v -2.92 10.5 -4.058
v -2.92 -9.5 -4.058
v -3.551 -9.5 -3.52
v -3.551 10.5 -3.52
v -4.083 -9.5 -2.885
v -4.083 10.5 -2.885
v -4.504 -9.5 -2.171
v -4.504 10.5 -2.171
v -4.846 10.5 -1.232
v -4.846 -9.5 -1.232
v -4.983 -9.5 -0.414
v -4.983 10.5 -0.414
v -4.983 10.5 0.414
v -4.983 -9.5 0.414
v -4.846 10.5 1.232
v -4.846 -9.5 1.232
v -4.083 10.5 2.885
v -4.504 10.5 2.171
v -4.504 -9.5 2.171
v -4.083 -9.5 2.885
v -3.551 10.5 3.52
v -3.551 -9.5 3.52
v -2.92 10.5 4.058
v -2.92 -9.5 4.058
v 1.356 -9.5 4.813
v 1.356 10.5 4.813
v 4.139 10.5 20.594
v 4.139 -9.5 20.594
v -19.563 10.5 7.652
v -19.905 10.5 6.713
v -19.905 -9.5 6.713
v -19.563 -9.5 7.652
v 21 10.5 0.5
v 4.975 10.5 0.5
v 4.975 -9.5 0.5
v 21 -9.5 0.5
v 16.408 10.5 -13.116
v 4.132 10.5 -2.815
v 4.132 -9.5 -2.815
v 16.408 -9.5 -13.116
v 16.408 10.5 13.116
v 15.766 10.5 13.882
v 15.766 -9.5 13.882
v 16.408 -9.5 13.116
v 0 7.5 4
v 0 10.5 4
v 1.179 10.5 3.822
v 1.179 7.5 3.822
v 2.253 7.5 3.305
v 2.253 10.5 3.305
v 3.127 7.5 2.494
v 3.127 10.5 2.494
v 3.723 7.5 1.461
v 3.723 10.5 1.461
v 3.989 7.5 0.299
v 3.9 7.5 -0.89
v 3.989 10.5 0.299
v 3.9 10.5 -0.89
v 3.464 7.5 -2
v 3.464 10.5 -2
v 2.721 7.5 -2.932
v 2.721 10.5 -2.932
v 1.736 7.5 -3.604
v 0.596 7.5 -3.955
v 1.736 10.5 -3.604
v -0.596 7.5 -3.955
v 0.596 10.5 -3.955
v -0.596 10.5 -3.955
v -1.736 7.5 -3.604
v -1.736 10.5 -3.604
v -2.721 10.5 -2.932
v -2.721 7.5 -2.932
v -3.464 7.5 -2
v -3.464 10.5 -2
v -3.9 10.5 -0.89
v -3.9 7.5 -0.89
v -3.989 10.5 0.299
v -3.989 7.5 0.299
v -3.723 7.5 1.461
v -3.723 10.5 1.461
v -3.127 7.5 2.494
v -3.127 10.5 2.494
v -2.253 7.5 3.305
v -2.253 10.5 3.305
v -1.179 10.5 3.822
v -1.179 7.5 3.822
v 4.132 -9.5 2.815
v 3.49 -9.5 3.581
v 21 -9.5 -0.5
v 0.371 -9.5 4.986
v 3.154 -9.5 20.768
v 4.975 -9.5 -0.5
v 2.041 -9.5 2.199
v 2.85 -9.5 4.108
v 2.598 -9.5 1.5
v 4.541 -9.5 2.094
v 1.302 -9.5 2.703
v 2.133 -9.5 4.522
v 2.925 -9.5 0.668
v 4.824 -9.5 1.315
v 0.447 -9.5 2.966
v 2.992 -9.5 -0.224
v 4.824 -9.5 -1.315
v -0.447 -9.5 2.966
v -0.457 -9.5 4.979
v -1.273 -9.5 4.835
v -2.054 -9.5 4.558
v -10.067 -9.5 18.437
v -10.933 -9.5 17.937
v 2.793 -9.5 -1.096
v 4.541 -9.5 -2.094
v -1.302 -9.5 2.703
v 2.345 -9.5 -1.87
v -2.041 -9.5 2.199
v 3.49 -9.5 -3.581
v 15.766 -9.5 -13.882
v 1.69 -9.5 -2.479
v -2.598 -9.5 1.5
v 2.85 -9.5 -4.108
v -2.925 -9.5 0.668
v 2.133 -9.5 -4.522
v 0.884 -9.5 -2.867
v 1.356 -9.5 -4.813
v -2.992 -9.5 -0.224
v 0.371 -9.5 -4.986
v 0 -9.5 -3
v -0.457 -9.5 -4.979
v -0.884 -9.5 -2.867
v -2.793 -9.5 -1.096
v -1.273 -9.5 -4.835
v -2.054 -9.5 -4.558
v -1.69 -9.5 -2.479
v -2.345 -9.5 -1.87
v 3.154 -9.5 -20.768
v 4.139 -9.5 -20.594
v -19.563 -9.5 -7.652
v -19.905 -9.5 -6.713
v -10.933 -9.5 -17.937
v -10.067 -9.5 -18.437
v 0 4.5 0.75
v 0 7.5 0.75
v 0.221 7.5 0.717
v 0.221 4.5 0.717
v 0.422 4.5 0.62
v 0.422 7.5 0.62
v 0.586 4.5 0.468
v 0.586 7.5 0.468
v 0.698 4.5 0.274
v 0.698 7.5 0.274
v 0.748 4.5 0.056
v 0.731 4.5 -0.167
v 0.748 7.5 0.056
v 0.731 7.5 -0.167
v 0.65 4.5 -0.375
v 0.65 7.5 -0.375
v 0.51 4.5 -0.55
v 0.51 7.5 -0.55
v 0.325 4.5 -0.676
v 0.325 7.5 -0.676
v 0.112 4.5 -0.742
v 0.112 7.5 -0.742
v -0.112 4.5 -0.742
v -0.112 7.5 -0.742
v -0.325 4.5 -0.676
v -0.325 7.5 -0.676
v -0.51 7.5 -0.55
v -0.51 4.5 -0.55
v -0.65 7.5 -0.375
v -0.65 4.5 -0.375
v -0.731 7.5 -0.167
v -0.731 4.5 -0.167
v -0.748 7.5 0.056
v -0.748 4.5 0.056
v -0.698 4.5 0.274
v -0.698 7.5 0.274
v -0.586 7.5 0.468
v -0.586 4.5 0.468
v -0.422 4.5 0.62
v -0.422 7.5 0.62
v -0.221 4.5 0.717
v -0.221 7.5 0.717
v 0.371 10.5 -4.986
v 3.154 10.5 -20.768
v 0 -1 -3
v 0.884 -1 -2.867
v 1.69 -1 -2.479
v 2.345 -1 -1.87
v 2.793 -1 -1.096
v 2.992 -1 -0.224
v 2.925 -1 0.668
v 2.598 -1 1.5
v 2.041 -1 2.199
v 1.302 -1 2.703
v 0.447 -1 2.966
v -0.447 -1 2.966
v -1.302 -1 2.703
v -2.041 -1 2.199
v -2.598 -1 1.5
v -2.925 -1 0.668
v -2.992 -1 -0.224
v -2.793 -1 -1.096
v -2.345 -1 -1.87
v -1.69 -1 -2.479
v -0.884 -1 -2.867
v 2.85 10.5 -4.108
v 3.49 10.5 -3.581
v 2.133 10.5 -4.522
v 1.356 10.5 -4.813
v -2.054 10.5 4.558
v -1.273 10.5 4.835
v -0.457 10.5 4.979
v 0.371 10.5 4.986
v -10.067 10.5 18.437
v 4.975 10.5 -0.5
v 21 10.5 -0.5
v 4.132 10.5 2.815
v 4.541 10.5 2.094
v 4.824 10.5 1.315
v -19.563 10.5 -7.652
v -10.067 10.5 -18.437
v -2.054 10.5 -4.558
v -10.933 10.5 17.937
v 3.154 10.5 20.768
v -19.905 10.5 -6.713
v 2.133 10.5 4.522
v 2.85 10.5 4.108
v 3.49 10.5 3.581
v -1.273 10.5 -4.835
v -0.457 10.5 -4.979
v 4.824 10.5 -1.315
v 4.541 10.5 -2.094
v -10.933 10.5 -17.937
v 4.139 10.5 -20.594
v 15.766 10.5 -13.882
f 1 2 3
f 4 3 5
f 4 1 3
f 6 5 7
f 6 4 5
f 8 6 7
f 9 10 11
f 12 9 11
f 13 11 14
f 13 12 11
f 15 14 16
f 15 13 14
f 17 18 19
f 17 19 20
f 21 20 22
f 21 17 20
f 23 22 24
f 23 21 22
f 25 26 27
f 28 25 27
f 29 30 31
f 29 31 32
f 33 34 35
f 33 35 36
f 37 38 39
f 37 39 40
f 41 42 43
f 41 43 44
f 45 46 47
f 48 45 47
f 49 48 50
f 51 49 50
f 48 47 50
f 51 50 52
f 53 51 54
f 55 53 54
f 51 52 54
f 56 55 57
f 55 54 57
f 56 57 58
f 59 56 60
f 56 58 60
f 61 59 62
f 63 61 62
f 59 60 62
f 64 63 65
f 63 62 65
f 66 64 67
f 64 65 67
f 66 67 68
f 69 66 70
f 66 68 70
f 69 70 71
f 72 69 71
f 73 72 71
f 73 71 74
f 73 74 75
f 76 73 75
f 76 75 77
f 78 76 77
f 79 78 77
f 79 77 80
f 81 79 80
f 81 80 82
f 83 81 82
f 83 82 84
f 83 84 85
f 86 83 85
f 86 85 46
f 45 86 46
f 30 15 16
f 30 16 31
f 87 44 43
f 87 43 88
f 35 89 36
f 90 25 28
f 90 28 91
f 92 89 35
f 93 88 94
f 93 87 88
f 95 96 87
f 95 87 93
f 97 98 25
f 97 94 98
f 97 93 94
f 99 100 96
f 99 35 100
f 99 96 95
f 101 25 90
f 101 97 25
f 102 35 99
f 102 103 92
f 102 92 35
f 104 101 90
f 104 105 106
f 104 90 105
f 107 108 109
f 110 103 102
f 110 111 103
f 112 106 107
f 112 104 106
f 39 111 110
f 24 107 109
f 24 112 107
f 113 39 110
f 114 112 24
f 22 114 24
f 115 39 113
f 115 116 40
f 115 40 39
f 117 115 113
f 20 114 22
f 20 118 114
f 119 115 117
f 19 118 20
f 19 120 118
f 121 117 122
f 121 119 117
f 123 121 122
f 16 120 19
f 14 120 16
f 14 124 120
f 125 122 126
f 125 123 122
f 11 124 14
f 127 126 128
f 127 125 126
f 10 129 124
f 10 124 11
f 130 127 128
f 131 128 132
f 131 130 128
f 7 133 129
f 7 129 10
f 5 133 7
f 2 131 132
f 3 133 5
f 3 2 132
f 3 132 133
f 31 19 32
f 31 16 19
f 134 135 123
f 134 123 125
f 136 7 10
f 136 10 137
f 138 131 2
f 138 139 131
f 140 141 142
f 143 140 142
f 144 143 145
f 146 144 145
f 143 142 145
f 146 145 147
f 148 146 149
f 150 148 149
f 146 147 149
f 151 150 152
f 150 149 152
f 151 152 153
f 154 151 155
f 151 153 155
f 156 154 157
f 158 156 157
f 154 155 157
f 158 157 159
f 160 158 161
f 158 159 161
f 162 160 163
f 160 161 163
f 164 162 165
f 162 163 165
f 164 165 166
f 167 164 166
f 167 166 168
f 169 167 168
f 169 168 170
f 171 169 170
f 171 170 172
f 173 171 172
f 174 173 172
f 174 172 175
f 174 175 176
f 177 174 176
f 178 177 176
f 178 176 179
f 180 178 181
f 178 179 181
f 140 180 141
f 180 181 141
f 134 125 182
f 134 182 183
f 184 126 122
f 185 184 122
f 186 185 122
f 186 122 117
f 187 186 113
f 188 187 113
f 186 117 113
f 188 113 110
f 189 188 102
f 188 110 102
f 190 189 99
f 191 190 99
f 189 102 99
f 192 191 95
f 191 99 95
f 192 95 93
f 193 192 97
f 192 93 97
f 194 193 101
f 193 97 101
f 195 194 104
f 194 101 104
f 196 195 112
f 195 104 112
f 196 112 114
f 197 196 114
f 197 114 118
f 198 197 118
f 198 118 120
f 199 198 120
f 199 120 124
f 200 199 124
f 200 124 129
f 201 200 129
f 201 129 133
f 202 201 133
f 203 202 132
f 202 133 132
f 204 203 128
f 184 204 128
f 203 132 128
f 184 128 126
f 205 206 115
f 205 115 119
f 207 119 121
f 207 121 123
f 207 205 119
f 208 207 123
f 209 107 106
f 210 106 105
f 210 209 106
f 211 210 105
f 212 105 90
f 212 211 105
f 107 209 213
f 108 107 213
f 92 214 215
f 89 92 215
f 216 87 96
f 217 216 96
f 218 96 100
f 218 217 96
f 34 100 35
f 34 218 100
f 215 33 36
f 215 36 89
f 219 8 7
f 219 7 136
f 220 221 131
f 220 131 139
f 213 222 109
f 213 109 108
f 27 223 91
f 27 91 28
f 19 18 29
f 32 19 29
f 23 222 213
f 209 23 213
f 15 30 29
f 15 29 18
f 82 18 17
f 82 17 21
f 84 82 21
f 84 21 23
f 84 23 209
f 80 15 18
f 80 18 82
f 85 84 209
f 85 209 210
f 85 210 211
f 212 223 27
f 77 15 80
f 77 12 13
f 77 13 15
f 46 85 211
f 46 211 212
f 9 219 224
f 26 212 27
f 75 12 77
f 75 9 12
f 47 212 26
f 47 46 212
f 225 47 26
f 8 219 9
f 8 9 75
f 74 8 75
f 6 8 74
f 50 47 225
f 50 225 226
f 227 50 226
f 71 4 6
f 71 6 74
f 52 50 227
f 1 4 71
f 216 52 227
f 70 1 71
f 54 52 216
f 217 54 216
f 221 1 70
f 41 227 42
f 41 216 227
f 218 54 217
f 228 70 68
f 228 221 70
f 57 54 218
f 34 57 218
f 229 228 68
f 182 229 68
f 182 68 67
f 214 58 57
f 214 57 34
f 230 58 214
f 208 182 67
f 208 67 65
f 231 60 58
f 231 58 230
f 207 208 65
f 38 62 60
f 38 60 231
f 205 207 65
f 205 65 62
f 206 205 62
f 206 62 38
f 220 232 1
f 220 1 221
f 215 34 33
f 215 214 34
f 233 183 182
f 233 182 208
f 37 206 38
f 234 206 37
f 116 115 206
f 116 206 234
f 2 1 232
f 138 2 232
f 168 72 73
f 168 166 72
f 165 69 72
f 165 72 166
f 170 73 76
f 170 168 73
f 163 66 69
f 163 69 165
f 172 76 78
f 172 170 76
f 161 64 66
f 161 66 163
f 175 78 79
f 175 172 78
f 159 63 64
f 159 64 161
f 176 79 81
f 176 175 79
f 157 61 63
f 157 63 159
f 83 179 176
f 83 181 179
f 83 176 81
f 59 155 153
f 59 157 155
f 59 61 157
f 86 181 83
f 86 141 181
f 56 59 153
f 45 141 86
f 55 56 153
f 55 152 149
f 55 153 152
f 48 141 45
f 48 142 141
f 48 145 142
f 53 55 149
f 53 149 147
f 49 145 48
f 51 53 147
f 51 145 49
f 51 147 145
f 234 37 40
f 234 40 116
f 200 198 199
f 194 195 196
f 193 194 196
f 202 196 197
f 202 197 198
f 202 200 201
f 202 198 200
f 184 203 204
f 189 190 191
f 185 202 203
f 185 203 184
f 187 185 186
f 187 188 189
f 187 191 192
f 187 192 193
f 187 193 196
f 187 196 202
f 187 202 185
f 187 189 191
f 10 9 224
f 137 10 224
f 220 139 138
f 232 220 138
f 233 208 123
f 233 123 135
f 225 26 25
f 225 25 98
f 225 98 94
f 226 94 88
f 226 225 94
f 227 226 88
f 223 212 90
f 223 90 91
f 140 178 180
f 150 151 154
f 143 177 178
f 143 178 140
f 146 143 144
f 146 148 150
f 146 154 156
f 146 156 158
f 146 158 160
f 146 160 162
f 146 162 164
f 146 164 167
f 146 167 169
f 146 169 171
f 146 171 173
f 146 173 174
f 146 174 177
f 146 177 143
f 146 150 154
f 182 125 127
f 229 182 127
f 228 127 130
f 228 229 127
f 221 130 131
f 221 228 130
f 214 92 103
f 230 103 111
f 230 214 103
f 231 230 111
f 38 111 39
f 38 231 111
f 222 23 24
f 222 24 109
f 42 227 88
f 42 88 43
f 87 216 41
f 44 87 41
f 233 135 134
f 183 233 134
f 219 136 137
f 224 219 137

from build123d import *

# Parameters (mm, degrees)
SKETCH1_R           = 5
SKETCH1_R_2         = 3
BOSS_EXTRUDE2_DEPTH = 17.5
SKETCH4_W           = 18
SKETCH4_H           = 1
EXTRUDE_THIN1_DEPTH = 35
CIRPATTERN1_COUNT   = 9
SKETCH5_R           = 3
BOSS_EXTRUDE3_DEPTH = 15
SKETCH6_R           = 3.5
SKETCH6_R_2         = 1.5
CUT_EXTRUDE1_DEPTH  = 6
SKETCH15_R          = 1.5
CUT_EXTRUDE2_DEPTH  = 2
SKETCH17_R          = 2.5
BOSS_EXTRUDE4_DEPTH = 3
SKETCH18_R          = 2
CUT_EXTRUDE3_DEPTH  = 2
SKETCH19_R          = 4
CUT_EXTRUDE4_DEPTH  = 20
SKETCH20_W          = 45.677284088
SKETCH20_H          = 45.724664858
CUT_EXTRUDE5_DEPTH  = 8
SKETCH21_R          = 3
BOSS_EXTRUDE5_DEPTH = 1
SKETCH24_R          = 9.912143672
BOSS_EXTRUDE6_DEPTH = 0.5
SKETCH25_R          = 3.2
CUT_EXTRUDE6_DEPTH  = 2.1
SKETCH26_R          = 3.2
BOSS_EXTRUDE7_DEPTH = 0.25
CUT_EXTRUDE8_START  = -7.5
CUT_EXTRUDE8_DEPTH  = 7.5
SKETCH28_R          = 0.5
CUT_EXTRUDE9_DEPTH  = 1.5
CUT_EXTRUDE10_DEPTH = 7
BOSS_EXTRUDE8_START = 10
SKETCH30_R          = 4
BOSS_EXTRUDE8_DEPTH = 10
SKETCH33_R          = 18.064901356
CUT_EXTRUDE13_DEPTH = 20
SKETCH34_R          = 3
CUT_EXTRUDE14_DEPTH = 8.5
SKETCH35_R          = 0.75
CUT_EXTRUDE16_DEPTH = 3


with BuildPart() as part:
    # Sketch1 → Boss-Extrude2 (new, symmetric)
    with BuildSketch(Plane(origin=(0, 0, 0), x_dir=(1, 0, 0), z_dir=(0, 1, 0))):
        with Locations(Location((0, 0, 0), (0, 0, 270))):
            Circle(SKETCH1_R)
        with Locations(Location((0, 0, 0), (0, 0, 270))):
            Circle(SKETCH1_R_2, mode=Mode.SUBTRACT)
    extrude(amount=BOSS_EXTRUDE2_DEPTH, both=True)

    # Sketch4 → Extrude-Thin1 (add)
    with BuildSketch(Plane(origin=(0, 17.5, 0), x_dir=(1, 0, 0), z_dir=(0, 1, 0))):
        with Locations((12, 0)):
            Rectangle(SKETCH4_W, SKETCH4_H)
    extrude_thin1 = extrude(amount=-EXTRUDE_THIN1_DEPTH)

    # CirPattern1: Extrude-Thin1 ×9 about axis
    cirpattern1_axis = Axis((0, 0, 0), (0, 1, 0))
    for i in range(1, CIRPATTERN1_COUNT):
        add(extrude_thin1.rotate(cirpattern1_axis, i * 360 / CIRPATTERN1_COUNT))

    # Sketch5 → Boss-Extrude3 (add)
    with BuildSketch(Plane(origin=(0, -17.5, 0), x_dir=(-1, 0, 0), z_dir=(0, -1, 0))):
        with Locations(Location((0, 0, 0), (0, 0, 90))):
            Circle(SKETCH5_R)
    extrude(amount=-BOSS_EXTRUDE3_DEPTH)

    # Sketch6 → Cut-Extrude1 (cut)
    with BuildSketch(Plane(origin=(0, -17.5, 0), x_dir=(-1, 0, 0), z_dir=(0, -1, 0))):
        with Locations(Location((0, 0, 0), (0, 0, 90))):
            Circle(SKETCH6_R)
        with Locations(Location((0, 0, 0), (0, 0, 90))):
            Circle(SKETCH6_R_2, mode=Mode.SUBTRACT)
    extrude(amount=-CUT_EXTRUDE1_DEPTH, mode=Mode.SUBTRACT)

    # Sketch15 → Cut-Extrude2 (cut)
    with BuildSketch(Plane.XZ.offset(17.5)):
        with Locations(Location((0, 0, 0), (0, 0, 270))):
            Circle(SKETCH15_R)
    extrude(amount=-CUT_EXTRUDE2_DEPTH, mode=Mode.SUBTRACT)

    # Sketch17 → Boss-Extrude4 (add)
    with BuildSketch(Plane.XZ.offset(17.5)):
        with Locations((18.5, 0)):
            Circle(SKETCH17_R)
    extrude(amount=-BOSS_EXTRUDE4_DEPTH)

    # Sketch18 → Cut-Extrude3 (cut)
    with BuildSketch(Plane.XZ.offset(17.5)):
        with Locations(Location((18.5, 0, 0), (0, 0, 270))):
            Circle(SKETCH18_R)
    extrude(amount=-CUT_EXTRUDE3_DEPTH, mode=Mode.SUBTRACT)

    # Sketch19 → Cut-Extrude4 (cut)
    with BuildSketch(Plane(origin=(0, 17.5, 0), x_dir=(1, 0, 0), z_dir=(0, 1, 0))):
        with Locations(Location((0, 0, 0), (0, 0, 270))):
            Circle(SKETCH19_R)
    extrude(amount=-CUT_EXTRUDE4_DEPTH, mode=Mode.SUBTRACT)

    # Sketch20 → Cut-Extrude5 (cut)
    with BuildSketch(Plane(origin=(0, -17.5, 0), x_dir=(-1, 0, 0), z_dir=(0, -1, 0))):
        Rectangle(SKETCH20_W, SKETCH20_H)
    extrude(amount=-CUT_EXTRUDE5_DEPTH, mode=Mode.SUBTRACT)

    # Sketch21 → Boss-Extrude5 (add)
    with BuildSketch(Plane.XZ.offset(9.5)):
        with Locations(Location((0, 0, 0), (0, 0, 90))):
            Circle(SKETCH21_R)
    extrude(amount=BOSS_EXTRUDE5_DEPTH)

    # Sketch23 → Revolve1 (revolve)
    with BuildSketch(Plane(origin=(0, 0, 0), x_dir=(0, 0, -1), z_dir=(1, 0, 0))):
        with BuildLine():
            Line((-3, -10.5), (-2, -10.5))
            Line((-2, -10.5), (0, -10.5))
            Line((0, -10.5), (0, -17.5))
            Line((0, -17.5), (-8.912143672, -17.5))
            Line((-8.912143672, -17.5), (-9.912143672, -17.5))
            ThreePointArc((-9.912143672, -17.5), (-7.260403323, -13.2057636), (-3, -10.5))
        make_face()
    revolve(axis=Axis((0, -11.130650603, 0), (0, -1, 0)))

    # Sketch24 → Boss-Extrude6 (add)
    with BuildSketch(Plane.XZ.offset(17.5)):
        with Locations(Location((0, 0, 0), (0, 0, 270))):
            Circle(SKETCH24_R)
    extrude(amount=BOSS_EXTRUDE6_DEPTH)

    # Sketch25 → Cut-Extrude6 (cut)
    with BuildSketch(Plane.XZ.offset(18)):
        with Locations(Location((-0.56668442, 5, 0), (0, 0, 270))):
            Circle(SKETCH25_R)
    extrude(amount=-CUT_EXTRUDE6_DEPTH, mode=Mode.SUBTRACT)

    # Sketch26 → Boss-Extrude7 (add)
    with BuildSketch(Plane.XZ.offset(18)):
        with Locations(Location((-0.56668442, 5, 0), (0, 0, 270))):
            Circle(SKETCH26_R)
    extrude(amount=-BOSS_EXTRUDE7_DEPTH)

    # Sketch27 → Cut-Extrude8 (cut)
    with BuildSketch(Plane.XZ.offset(18).offset(CUT_EXTRUDE8_START)):
        with BuildLine():
            ThreePointArc((-5.368630905, 4.991892601), (-6.424807204, 5.779358473), (-7.613826501, 6.346671425))
            ThreePointArc((-7.613826501, 6.346671425), (-9.912143672, 0), (-7.613826501, -6.346671425))
            ThreePointArc((-7.613826501, -6.346671425), (-6.424807204, -5.779358473), (-5.368630905, -4.991892601))
            ThreePointArc((-5.368630905, -4.991892601), (-3.162143672, 0), (-5.368630905, 4.991892601))
        make_face()
        with BuildLine():
            ThreePointArc((9.912143672, 0), (9.319869483, 3.375), (7.613826501, 6.346671425))
            ThreePointArc((7.613826501, 6.346671425), (6.424807204, 5.779358473), (5.368630905, 4.991892601))
            ThreePointArc((5.368630905, 4.991892601), (3.162143672, 0), (5.368630905, -4.991892601))
            ThreePointArc((5.368630905, -4.991892601), (6.424807204, -5.779358473), (7.613826501, -6.346671425))
            ThreePointArc((7.613826501, -6.346671425), (9.319869483, -3.375), (9.912143672, 0))
        make_face()
        with BuildLine():
            ThreePointArc((-5.368630905, -4.991892601), (-6.424807204, -5.779358473), (-7.613826501, -6.346671425))
            ThreePointArc((-7.613826501, -6.346671425), (-4.203657524, -8.976628297), (0, -9.912143672))
            add(Edge.make_bspline(
                [(-5.368630905, -4.991892601), (-4.998119196, -7.539682857), (-2.616364035, -9.837937814), (0, -9.912143672)],
                knots=[0, 0, 0, 0, 1, 1, 1, 1], degree=3))
        make_face()
        with BuildLine():
            add(Edge.make_bspline(
                [(5.368630905, -4.991892601), (4.998119196, -7.539682857), (2.616364035, -9.837937814), (0, -9.912143672)],
                knots=[0, 0, 0, 0, 1, 1, 1, 1], degree=3))
            ThreePointArc((0, -9.912143672), (4.203657524, -8.976628297), (7.613826501, -6.346671425))
            ThreePointArc((7.613826501, -6.346671425), (6.424807204, -5.779358473), (5.368630905, -4.991892601))
        make_face()
        with BuildLine():
            ThreePointArc((0, 9.912143672), (-4.203657524, 8.976628297), (-7.613826501, 6.346671425))
            ThreePointArc((-7.613826501, 6.346671425), (-6.424807204, 5.779358473), (-5.368630905, 4.991892601))
            add(Edge.make_bspline(
                [(-5.368630905, 4.991892601), (-4.998119196, 7.539682857), (-2.616364035, 9.837937814), (0, 9.912143672)],
                knots=[0, 0, 0, 0, 1, 1, 1, 1], degree=3))
        make_face()
        with BuildLine():
            ThreePointArc((7.613826501, 6.346671425), (4.203657524, 8.976628297), (0, 9.912143672))
            add(Edge.make_bspline(
                [(5.368630905, 4.991892601), (4.998119196, 7.539682857), (2.616364035, 9.837937814), (0, 9.912143672)],
                knots=[0, 0, 0, 0, 1, 1, 1, 1], degree=3))
            ThreePointArc((5.368630905, 4.991892601), (6.424807204, 5.779358473), (7.613826501, 6.346671425))
        make_face()
    extrude(amount=CUT_EXTRUDE8_DEPTH, mode=Mode.SUBTRACT)

    # Sketch28 → Cut-Extrude9 (cut)
    with BuildSketch(Plane.XZ.offset(18)):
        with Locations(Location((0, 0, 0), (0, 0, 270))):
            Circle(SKETCH28_R)
    extrude(amount=-CUT_EXTRUDE9_DEPTH, mode=Mode.SUBTRACT)

    # Sketch29 → Cut-Extrude10 (cut)
    with BuildSketch(Plane(origin=(0, 17.5, 0), x_dir=(1, 0, 0), z_dir=(0, 1, 0))):
        with BuildLine():
            Line((3.489629181, -3.580850203), (15.765539501, -13.881562025))
            Line((15.765539501, -13.881562025), (16.40832711, -13.115517582))
            Line((16.40832711, -13.115517582), (4.132416791, -2.81480576))
            ThreePointArc((4.132416791, -2.81480576), (4.698463104, -1.710100717), (4.974937186, -0.5))
            Line((4.974937186, -0.5), (21, -0.5))
            Line((21, -0.5), (21, 0.5))
            Line((21, 0.5), (4.974937186, 0.5))
            ThreePointArc((4.974937186, 0.5), (4.698463104, 1.710100717), (4.132416791, 2.81480576))
            Line((4.132416791, 2.81480576), (16.40832711, 13.115517582))
            Line((16.40832711, 13.115517582), (15.765539501, 13.881562025))
            Line((15.765539501, 13.881562025), (3.489629181, 3.580850203))
            ThreePointArc((3.489629181, 3.580850203), (2.5, 4.330127019), (1.356292653, 4.812532622))
            Line((1.356292653, 4.812532622), (4.139015608, 20.594138724))
            Line((4.139015608, 20.594138724), (3.154207854, 20.767786902))
            Line((3.154207854, 20.767786902), (0.3714849, 4.9861808))
            ThreePointArc((0.3714849, 4.9861808), (-0.868240888, 4.924038765), (-2.054455891, 4.558421985))
            Line((-2.054455891, 4.558421985), (-10.066987298, 18.436533479))
            Line((-10.066987298, 18.436533479), (-10.933012702, 17.936533479))
            Line((-10.933012702, 17.936533479), (-2.920481295, 4.058421985))
            ThreePointArc((-2.920481295, 4.058421985), (-3.830222216, 3.213938048), (-4.50390169, 2.17137504))
            Line((-4.50390169, 2.17137504), (-19.562534965, 7.65226932))
            Line((-19.562534965, 7.65226932), (-19.904555108, 6.712576699))
            Line((-19.904555108, 6.712576699), (-4.845921834, 1.231682419))
            ThreePointArc((-4.845921834, 1.231682419), (-5, 0), (-4.845921834, -1.231682419))
            Line((-4.845921834, -1.231682419), (-19.904555108, -6.712576699))
            Line((-19.904555108, -6.712576699), (-19.562534965, -7.65226932))
            Line((-19.562534965, -7.65226932), (-4.50390169, -2.17137504))
            ThreePointArc((-4.50390169, -2.17137504), (-3.830222216, -3.213938048), (-2.920481295, -4.058421985))
            Line((-2.920481295, -4.058421985), (-10.933012702, -17.936533479))
            Line((-10.933012702, -17.936533479), (-10.066987298, -18.436533479))
            Line((-10.066987298, -18.436533479), (-2.054455891, -4.558421985))
            ThreePointArc((-2.054455891, -4.558421985), (-0.868240888, -4.924038765), (0.3714849, -4.9861808))
            Line((0.3714849, -4.9861808), (3.154207854, -20.767786902))
            Line((3.154207854, -20.767786902), (4.139015608, -20.594138724))
            Line((4.139015608, -20.594138724), (1.356292653, -4.812532622))
            ThreePointArc((1.356292653, -4.812532622), (2.5, -4.330127019), (3.489629181, -3.580850203))
        make_face()
    extrude(amount=-CUT_EXTRUDE10_DEPTH, mode=Mode.SUBTRACT)

    # Sketch30 → Boss-Extrude8 (add)
    with BuildSketch(Plane(origin=(0, -2.5, 0), x_dir=(1, 0, 0), z_dir=(0, 1, 0)).offset(BOSS_EXTRUDE8_START)):
        with Locations(Location((0, 0, 0), (0, 0, 270))):
            Circle(SKETCH30_R)
    extrude(amount=-BOSS_EXTRUDE8_DEPTH)

    # Sketch33 → Cut-Extrude13 (cut)
    with BuildSketch(Plane.XZ.offset(9.5)):
        Circle(SKETCH33_R)
    extrude(amount=CUT_EXTRUDE13_DEPTH, mode=Mode.SUBTRACT)

    # Sketch34 → Cut-Extrude14 (cut)
    with BuildSketch(Plane.XZ.offset(9.5)):
        with Locations(Location((0, 0, 0), (0, 0, 270))):
            Circle(SKETCH34_R)
    extrude(amount=-CUT_EXTRUDE14_DEPTH, mode=Mode.SUBTRACT)

    # Sketch35 → Cut-Extrude16 (cut)
    with BuildSketch(Plane(origin=(0, 7.5, 0), x_dir=(1, 0, 0), z_dir=(0, 1, 0))):
        with Locations(Location((0, 0, 0), (0, 0, 270))):
            Circle(SKETCH35_R)
    extrude(amount=-CUT_EXTRUDE16_DEPTH, mode=Mode.SUBTRACT)


solid = part.part
